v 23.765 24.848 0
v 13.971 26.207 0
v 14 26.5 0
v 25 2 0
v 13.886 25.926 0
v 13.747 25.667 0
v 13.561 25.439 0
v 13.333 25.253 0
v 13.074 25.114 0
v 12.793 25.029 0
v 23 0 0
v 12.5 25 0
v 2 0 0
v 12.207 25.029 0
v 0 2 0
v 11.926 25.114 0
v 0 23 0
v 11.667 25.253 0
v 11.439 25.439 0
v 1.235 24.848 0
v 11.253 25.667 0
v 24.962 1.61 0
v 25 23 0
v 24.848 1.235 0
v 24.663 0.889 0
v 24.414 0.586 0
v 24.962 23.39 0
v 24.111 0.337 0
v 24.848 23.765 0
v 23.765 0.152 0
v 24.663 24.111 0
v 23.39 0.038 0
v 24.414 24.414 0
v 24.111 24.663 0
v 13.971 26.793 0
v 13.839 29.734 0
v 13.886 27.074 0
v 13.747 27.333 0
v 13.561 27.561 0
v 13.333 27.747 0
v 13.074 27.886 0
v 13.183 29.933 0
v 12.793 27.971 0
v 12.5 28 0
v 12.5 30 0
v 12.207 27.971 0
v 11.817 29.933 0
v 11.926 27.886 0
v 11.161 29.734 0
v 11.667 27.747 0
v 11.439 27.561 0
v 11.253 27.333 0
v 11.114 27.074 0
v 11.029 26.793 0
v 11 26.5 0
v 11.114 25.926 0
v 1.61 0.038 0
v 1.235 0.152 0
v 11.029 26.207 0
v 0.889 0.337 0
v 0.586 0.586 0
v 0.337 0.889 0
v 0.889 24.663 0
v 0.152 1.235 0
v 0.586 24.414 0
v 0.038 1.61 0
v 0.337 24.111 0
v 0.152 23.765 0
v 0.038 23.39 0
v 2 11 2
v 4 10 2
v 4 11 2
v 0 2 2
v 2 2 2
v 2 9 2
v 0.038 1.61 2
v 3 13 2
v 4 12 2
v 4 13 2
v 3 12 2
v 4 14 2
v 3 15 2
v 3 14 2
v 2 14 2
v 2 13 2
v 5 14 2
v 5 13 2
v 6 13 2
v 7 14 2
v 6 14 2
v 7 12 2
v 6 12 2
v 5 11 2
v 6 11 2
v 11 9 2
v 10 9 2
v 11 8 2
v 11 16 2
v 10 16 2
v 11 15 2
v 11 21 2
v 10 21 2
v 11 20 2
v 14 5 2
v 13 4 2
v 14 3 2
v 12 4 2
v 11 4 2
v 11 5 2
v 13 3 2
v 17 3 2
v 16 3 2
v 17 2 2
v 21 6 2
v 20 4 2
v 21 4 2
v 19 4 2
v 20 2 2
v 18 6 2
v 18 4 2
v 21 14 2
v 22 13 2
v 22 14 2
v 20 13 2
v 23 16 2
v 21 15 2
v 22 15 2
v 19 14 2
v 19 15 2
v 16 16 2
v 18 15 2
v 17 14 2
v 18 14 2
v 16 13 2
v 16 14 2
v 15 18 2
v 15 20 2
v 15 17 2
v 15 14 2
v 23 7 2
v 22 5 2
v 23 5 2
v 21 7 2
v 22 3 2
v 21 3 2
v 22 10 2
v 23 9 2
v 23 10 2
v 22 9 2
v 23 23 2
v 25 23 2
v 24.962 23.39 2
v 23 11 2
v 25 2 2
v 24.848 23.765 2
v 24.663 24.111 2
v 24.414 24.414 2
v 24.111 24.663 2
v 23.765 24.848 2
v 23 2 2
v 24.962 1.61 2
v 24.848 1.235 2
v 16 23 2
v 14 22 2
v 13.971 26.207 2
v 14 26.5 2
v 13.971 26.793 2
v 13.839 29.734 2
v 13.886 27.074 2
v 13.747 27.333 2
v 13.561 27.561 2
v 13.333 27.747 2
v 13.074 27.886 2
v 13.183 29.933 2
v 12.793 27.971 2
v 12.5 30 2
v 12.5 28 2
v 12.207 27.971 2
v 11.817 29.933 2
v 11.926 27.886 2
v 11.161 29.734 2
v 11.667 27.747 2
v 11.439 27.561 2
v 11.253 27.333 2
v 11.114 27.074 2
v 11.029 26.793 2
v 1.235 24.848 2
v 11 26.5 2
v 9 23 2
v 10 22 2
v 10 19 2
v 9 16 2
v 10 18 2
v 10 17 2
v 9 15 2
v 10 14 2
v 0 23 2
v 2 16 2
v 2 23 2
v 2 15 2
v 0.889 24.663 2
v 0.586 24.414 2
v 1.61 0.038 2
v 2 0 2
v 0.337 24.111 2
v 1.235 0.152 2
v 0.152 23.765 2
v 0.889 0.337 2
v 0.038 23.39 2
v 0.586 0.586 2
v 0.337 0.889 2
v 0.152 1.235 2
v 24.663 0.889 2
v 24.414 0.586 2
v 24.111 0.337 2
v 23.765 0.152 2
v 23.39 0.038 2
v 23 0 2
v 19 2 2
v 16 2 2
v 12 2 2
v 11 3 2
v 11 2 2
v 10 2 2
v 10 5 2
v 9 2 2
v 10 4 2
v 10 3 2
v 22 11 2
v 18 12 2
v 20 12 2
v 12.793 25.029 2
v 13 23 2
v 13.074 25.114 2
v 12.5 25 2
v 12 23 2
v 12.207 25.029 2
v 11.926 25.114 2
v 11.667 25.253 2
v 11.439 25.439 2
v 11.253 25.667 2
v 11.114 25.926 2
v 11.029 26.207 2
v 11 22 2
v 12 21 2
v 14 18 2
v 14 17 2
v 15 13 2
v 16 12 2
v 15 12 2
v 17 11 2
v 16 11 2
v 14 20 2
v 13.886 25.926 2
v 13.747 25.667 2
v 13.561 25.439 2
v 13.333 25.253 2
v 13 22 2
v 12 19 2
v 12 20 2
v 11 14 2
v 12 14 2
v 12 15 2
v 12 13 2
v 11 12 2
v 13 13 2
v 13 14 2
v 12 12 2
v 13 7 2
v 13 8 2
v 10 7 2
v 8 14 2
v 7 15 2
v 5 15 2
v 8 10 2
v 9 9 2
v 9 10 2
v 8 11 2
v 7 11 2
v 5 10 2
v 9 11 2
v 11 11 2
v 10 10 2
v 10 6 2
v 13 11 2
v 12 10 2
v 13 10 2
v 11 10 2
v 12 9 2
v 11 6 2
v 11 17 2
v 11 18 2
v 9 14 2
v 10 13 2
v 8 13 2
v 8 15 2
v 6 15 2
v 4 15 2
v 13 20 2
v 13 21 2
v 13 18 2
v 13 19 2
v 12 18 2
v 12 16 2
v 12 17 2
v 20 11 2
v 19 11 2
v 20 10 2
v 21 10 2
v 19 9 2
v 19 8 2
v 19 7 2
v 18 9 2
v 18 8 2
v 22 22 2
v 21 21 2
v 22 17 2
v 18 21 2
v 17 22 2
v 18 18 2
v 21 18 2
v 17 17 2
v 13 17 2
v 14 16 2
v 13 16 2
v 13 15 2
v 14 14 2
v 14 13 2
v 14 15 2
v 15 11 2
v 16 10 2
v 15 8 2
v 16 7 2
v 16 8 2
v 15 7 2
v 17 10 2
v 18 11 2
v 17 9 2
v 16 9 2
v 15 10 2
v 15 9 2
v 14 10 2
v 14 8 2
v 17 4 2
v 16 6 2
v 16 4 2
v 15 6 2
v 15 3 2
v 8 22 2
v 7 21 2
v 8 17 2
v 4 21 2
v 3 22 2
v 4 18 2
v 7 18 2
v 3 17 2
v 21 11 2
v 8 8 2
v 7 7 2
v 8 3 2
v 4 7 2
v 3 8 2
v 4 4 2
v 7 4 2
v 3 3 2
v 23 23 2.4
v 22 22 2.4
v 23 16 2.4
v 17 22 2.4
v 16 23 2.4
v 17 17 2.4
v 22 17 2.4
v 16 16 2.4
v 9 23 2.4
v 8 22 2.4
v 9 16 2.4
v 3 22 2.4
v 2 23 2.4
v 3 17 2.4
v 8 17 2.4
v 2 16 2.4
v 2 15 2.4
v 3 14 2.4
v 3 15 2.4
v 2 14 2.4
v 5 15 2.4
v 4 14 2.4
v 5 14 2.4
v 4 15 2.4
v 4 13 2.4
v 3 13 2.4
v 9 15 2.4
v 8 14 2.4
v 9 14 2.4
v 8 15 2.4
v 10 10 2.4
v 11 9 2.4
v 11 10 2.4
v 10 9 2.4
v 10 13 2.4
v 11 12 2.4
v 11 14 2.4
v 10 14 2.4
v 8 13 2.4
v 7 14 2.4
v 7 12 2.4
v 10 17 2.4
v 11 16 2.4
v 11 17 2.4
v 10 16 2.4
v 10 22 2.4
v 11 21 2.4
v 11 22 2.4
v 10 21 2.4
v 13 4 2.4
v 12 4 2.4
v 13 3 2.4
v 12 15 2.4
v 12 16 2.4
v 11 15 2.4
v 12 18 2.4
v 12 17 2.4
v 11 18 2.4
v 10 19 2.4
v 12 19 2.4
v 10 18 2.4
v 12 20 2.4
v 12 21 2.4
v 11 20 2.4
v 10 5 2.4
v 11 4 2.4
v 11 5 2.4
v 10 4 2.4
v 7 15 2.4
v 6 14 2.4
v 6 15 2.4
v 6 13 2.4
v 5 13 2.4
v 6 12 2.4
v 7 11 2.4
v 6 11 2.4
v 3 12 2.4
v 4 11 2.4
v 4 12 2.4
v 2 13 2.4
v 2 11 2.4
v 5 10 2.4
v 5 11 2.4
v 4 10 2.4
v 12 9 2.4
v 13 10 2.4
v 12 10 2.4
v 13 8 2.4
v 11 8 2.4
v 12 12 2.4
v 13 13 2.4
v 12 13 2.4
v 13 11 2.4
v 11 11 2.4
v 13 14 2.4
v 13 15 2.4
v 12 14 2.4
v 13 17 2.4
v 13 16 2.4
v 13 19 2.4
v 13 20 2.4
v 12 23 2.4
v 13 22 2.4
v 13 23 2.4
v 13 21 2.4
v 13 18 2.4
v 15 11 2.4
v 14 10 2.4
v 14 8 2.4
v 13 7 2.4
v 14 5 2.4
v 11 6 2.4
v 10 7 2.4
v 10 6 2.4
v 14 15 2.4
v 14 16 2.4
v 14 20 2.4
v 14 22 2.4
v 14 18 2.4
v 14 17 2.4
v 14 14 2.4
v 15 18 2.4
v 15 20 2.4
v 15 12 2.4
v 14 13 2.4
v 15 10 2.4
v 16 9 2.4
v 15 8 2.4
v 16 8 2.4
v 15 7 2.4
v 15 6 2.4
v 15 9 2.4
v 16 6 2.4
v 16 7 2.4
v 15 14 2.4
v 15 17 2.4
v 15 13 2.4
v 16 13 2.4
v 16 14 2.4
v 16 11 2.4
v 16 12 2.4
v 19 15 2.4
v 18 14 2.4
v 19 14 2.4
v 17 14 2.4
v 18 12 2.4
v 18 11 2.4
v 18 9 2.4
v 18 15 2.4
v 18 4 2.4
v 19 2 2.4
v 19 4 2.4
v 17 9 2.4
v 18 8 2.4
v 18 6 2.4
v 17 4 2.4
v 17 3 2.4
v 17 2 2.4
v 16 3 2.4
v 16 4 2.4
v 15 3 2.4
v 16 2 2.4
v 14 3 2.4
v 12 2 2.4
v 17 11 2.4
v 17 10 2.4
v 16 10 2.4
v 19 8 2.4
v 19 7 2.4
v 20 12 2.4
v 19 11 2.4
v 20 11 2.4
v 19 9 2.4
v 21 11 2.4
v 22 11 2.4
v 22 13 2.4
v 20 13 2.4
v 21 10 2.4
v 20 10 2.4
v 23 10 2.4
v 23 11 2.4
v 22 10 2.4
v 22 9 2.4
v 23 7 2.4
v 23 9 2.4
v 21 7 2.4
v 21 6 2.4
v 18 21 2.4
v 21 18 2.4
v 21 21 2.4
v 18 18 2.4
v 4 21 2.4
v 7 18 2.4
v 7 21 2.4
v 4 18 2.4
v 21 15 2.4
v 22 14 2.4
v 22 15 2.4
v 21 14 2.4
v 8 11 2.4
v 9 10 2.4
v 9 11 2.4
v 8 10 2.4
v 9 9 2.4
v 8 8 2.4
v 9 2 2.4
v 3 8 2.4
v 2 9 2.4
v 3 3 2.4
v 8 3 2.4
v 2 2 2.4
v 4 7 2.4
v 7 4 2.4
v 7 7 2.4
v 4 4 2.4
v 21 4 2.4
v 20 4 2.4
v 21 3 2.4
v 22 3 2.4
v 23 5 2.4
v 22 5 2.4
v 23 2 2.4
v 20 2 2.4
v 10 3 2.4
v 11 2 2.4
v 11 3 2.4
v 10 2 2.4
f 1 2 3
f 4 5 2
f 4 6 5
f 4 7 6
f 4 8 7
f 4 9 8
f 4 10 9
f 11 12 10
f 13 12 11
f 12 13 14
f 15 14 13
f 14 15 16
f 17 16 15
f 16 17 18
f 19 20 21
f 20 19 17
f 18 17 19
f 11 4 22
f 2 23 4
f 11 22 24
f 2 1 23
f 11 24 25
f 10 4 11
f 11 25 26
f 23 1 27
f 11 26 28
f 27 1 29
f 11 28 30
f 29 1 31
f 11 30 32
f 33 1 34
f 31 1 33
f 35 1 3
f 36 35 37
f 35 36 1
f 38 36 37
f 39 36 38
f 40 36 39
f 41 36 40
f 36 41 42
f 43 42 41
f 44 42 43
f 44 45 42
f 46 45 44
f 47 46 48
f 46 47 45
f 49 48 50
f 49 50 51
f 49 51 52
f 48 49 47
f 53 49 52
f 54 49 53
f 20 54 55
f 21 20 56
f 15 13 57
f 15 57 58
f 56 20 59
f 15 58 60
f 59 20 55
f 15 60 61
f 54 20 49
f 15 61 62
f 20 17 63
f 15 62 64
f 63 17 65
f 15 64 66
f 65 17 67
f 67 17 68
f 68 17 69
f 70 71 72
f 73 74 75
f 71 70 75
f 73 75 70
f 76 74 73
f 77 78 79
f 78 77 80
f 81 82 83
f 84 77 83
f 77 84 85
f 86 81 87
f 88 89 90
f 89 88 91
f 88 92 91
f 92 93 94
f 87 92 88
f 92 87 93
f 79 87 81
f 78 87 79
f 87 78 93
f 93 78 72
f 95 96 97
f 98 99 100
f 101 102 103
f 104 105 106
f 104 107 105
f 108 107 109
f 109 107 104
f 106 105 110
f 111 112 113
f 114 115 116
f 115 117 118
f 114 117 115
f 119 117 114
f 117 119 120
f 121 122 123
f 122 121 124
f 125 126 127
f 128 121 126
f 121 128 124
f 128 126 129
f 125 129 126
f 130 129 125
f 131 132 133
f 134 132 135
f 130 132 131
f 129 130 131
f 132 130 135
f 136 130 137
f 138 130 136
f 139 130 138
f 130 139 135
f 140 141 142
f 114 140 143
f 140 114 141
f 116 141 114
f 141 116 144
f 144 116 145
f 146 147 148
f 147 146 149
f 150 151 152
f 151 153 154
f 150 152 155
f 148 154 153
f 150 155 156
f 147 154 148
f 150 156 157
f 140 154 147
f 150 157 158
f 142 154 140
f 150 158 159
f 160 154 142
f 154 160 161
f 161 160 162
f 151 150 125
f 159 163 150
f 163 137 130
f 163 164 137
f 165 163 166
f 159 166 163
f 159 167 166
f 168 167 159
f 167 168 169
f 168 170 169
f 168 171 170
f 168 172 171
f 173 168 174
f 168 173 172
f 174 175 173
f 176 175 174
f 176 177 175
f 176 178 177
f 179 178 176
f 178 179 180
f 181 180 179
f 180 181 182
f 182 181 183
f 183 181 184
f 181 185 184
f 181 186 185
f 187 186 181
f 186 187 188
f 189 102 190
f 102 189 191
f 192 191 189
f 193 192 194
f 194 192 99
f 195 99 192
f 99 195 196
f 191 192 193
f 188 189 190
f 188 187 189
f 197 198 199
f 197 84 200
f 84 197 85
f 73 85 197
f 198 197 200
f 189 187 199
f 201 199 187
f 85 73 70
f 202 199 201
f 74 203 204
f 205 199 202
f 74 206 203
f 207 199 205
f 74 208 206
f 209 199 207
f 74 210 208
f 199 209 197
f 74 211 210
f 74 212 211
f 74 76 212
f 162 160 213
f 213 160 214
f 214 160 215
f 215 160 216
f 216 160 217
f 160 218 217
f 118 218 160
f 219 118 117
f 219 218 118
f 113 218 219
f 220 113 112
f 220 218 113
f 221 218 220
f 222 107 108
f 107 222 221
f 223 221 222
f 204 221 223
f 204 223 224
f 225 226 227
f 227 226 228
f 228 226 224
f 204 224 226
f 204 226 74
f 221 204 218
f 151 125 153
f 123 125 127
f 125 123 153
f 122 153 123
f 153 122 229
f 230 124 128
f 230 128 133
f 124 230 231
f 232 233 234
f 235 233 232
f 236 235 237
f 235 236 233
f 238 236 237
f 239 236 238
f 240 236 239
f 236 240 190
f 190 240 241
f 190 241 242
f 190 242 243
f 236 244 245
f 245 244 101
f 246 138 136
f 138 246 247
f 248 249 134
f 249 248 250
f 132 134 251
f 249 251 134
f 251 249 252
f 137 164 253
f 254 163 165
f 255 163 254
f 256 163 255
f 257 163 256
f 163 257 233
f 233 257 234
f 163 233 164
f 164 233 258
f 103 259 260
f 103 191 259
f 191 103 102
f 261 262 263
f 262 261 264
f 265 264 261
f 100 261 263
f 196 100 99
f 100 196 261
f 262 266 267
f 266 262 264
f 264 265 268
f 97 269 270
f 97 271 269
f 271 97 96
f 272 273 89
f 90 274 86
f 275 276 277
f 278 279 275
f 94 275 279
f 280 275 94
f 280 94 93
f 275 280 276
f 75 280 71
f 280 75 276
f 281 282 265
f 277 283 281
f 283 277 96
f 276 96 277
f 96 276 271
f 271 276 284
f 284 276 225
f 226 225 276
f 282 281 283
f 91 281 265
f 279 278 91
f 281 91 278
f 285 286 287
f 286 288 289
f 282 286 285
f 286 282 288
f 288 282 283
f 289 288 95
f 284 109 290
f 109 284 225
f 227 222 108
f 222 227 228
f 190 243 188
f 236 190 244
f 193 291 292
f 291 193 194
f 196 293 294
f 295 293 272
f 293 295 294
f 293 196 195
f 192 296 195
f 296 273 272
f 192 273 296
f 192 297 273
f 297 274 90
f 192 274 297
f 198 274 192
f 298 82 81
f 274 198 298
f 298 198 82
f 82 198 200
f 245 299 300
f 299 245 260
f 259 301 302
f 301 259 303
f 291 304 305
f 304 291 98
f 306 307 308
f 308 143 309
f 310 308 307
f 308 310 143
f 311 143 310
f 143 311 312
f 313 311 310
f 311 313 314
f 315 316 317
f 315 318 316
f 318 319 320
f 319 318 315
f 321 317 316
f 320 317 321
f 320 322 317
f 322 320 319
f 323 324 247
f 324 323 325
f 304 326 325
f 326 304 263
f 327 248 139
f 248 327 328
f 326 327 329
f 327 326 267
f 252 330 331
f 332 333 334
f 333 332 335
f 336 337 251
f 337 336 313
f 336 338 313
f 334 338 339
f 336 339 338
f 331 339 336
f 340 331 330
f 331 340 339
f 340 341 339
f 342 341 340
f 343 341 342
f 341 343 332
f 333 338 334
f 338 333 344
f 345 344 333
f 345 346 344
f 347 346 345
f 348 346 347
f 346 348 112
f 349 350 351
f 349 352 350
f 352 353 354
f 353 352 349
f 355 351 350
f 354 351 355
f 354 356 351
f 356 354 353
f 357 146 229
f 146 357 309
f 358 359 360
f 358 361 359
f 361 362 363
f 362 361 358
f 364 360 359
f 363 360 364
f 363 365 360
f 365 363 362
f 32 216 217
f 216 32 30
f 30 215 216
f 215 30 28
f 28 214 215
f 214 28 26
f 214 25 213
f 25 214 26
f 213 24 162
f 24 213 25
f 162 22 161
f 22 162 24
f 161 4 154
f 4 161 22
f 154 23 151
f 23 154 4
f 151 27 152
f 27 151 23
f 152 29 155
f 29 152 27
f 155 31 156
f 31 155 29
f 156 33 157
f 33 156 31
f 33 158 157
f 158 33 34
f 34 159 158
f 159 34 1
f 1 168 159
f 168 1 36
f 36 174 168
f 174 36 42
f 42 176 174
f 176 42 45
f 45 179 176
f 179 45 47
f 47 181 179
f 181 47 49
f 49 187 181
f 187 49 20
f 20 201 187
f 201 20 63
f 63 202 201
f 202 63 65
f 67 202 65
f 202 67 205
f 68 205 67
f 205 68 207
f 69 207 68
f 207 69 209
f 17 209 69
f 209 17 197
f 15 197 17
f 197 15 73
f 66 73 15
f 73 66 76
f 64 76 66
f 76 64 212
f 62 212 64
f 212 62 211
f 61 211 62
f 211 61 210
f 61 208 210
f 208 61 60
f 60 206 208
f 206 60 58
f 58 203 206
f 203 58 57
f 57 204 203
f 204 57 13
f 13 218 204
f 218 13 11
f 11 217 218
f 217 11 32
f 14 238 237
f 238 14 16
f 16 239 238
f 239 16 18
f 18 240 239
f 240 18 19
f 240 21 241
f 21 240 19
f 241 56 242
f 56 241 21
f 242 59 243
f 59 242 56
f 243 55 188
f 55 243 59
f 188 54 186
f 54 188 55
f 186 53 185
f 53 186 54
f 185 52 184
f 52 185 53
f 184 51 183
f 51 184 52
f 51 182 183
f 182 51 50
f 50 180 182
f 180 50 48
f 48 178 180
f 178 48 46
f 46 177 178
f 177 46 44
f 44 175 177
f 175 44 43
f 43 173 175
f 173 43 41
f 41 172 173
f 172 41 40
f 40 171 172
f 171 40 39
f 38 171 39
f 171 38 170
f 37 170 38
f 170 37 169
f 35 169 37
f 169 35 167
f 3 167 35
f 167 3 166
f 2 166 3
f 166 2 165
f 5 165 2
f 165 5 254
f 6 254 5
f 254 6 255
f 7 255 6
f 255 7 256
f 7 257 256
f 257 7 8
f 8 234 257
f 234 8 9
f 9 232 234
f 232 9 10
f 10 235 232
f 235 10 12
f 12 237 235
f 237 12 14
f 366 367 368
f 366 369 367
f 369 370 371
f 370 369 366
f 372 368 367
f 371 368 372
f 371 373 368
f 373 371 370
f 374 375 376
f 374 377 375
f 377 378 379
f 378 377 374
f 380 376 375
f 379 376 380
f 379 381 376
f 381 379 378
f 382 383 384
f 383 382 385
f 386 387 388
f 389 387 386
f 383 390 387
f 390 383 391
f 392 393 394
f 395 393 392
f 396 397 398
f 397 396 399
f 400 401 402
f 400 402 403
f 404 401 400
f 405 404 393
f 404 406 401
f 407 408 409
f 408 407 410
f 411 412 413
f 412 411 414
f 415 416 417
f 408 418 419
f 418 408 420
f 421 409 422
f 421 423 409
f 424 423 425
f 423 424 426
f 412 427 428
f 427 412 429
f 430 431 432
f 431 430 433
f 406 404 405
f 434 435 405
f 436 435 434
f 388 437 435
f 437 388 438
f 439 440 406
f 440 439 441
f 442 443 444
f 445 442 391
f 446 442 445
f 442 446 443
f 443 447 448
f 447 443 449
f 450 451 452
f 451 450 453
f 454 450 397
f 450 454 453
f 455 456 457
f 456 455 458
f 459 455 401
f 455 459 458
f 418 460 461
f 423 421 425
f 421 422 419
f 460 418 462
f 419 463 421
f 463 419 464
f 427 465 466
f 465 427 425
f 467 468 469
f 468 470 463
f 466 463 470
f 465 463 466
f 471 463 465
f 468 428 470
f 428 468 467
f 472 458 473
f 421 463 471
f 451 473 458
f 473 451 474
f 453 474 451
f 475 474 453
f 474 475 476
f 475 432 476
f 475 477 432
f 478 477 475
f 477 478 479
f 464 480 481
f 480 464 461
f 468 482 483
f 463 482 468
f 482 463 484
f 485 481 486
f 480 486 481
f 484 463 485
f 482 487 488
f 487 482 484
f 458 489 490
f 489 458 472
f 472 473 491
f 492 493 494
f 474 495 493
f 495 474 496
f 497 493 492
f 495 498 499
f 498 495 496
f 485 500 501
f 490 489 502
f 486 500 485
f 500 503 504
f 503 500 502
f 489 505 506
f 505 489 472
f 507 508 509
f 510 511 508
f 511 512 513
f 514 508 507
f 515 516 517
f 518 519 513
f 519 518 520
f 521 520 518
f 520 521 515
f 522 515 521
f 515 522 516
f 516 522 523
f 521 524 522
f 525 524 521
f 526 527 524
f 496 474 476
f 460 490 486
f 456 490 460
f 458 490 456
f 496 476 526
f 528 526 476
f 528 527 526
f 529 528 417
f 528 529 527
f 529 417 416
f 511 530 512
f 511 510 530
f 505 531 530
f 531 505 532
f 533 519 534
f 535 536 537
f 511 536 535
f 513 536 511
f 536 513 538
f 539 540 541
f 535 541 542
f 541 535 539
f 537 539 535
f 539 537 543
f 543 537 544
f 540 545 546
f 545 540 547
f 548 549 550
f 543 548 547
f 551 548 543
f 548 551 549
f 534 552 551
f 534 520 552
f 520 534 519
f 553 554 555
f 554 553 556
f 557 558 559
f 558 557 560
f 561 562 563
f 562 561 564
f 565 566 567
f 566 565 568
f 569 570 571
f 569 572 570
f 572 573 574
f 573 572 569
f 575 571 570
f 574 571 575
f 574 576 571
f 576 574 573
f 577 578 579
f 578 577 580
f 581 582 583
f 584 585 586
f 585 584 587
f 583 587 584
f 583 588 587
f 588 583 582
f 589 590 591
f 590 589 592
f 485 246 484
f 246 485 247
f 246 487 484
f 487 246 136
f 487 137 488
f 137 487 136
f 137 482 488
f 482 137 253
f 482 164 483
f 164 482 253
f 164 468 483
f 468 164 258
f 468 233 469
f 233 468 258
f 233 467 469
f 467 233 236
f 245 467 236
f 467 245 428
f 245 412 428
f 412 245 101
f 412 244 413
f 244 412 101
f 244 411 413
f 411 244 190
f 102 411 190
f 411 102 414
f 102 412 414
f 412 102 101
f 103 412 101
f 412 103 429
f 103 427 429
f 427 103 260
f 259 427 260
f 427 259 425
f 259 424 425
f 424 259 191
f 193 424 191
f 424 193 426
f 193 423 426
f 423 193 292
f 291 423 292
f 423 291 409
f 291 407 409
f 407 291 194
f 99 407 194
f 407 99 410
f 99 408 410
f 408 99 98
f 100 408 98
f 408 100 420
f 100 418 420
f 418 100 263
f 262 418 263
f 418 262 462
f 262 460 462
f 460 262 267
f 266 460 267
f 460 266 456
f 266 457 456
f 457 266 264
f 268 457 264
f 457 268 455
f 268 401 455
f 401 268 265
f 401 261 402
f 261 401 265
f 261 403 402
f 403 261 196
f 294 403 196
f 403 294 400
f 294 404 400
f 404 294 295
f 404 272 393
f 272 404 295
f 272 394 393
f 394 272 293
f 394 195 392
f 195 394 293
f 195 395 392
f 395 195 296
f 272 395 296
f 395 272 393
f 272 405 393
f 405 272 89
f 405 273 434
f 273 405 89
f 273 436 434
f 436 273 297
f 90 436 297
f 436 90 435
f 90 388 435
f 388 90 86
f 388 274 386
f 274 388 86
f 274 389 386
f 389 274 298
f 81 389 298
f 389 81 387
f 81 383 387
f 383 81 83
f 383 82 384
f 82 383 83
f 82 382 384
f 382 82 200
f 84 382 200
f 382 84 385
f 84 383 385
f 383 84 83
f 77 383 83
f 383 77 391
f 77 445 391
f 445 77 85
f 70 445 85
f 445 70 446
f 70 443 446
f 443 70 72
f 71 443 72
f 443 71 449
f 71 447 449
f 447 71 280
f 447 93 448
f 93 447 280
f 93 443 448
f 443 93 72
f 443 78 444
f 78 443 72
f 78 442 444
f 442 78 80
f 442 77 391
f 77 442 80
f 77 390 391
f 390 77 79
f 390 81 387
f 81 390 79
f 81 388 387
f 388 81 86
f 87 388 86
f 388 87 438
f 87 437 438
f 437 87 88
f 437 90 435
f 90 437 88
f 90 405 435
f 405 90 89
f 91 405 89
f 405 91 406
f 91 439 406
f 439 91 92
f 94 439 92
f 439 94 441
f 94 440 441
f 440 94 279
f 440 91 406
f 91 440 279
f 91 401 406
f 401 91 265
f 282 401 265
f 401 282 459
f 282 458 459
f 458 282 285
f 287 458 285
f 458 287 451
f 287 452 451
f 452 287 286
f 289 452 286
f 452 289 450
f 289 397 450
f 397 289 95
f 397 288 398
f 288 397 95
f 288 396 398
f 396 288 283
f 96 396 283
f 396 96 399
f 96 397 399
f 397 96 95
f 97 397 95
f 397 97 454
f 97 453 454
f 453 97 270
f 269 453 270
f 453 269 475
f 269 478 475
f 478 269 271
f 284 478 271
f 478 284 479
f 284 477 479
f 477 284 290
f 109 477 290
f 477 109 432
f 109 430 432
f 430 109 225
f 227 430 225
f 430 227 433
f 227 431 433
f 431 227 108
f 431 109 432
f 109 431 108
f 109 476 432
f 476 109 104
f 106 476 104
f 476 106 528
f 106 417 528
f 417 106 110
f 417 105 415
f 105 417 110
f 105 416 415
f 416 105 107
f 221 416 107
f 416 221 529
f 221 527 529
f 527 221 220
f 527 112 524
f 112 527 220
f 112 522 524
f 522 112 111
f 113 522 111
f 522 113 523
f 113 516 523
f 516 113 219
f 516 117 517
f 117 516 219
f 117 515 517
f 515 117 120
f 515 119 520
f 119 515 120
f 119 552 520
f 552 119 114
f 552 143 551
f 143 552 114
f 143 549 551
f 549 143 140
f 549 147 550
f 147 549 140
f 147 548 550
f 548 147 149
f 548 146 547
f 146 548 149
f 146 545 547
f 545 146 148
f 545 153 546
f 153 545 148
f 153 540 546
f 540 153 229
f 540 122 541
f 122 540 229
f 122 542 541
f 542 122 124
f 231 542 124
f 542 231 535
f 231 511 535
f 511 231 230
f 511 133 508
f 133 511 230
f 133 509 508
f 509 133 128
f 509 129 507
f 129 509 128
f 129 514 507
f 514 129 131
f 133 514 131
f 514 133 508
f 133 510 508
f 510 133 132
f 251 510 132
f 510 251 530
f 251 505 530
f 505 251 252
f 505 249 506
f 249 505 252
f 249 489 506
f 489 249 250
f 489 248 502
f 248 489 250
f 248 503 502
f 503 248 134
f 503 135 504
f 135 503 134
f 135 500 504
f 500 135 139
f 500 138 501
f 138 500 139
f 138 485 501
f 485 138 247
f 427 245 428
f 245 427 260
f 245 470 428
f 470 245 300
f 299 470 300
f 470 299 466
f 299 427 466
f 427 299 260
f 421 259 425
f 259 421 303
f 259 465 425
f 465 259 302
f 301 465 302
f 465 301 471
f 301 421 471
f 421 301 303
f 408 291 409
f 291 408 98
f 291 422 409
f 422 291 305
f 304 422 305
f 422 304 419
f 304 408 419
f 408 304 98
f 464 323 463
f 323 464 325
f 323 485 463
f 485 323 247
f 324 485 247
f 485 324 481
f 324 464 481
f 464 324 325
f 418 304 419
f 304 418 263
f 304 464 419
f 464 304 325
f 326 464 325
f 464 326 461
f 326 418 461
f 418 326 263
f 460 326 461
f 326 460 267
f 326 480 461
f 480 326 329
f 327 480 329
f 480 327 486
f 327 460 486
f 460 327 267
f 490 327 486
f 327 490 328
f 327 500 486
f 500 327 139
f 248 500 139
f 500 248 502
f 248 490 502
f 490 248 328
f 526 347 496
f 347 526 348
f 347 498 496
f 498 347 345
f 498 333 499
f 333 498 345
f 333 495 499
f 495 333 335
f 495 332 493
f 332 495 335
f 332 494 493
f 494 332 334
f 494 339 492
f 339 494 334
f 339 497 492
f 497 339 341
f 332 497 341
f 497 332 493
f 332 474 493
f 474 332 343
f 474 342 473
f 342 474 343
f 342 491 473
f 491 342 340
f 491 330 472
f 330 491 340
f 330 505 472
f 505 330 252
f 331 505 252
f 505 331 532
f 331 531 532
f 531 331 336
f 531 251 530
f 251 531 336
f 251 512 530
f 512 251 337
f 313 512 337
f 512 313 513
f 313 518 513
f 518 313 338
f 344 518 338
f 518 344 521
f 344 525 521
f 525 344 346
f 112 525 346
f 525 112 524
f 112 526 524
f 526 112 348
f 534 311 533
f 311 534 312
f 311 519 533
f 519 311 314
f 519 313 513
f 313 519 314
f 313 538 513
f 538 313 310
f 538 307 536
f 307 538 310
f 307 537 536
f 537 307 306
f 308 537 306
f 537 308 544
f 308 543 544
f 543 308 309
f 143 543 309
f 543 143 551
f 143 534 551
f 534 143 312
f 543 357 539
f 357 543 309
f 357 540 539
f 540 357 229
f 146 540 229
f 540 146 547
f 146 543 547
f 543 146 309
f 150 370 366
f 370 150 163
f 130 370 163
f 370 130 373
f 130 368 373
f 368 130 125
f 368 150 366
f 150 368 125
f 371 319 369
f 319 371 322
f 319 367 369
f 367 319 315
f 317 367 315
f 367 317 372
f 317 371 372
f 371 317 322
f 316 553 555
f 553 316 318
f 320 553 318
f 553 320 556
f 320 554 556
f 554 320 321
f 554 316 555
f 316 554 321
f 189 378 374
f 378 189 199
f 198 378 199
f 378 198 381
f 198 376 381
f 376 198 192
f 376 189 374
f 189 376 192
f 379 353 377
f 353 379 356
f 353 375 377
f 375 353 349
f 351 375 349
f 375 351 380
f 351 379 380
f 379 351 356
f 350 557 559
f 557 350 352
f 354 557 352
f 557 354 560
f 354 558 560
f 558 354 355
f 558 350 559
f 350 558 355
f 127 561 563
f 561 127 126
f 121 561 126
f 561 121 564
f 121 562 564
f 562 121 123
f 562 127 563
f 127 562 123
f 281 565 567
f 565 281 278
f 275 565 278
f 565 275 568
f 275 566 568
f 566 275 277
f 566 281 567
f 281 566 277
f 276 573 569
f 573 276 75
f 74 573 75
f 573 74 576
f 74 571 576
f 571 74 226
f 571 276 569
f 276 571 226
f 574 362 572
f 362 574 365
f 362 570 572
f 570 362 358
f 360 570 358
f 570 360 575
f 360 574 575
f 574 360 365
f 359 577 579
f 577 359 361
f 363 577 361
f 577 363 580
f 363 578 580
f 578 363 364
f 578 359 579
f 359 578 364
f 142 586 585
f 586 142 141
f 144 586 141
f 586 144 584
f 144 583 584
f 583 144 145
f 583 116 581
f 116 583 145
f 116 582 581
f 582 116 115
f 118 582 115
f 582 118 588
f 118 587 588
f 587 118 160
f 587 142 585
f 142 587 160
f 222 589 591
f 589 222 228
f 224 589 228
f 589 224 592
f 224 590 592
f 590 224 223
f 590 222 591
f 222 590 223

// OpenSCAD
// This demo shows how to use the QR code generator to generate a tag (ie. for a dog collar)
// with size derived from the amount of data to encode.

include <qr.scad>;

/* [Print options] */
// The minimum printable module ("pixel") size, based on the printer's resolution
module_size = 1;

/* [Tag options] */
// The data to encode
data = "Hello, world!";
// Error correction level (L, M, Q, H)
error_correction = "M"; // [L, M, Q, H]
// Thickness of the tag base
base_thickness = 2;
// Thickness of the embossed code
code_thickness = .4;
// Space between the QR code and the tag's edge
padding = 2;
// Diameter of the hole for the tag's ring; set to 0 to disable
hole_diameter = 3;
// Tag corner radius
corner_radius = 2;

/* [Hidden] */
$fn = 32;
modules = qr_size(message = data);
size = modules * module_size + padding * 2;

// Create the baseplate
color("#ccc") linear_extrude(height = base_thickness) difference() {
    // Outer shape
    hull() {
        translate([corner_radius, corner_radius]) circle(r = corner_radius);
        translate([size - corner_radius, corner_radius]) circle(r = corner_radius);
        translate([corner_radius, size - corner_radius]) circle(r = corner_radius);
        translate([size - corner_radius, size - corner_radius]) circle(r = corner_radius);
        if(hole_diameter > 0) translate([size / 2, size + hole_diameter / 2]) circle(d = hole_diameter + 2 * padding);
    }
    if(hole_diameter > 0) translate([size / 2, size + hole_diameter / 2]) circle(d = hole_diameter);
}

// Create the QR code
color("#333")
translate([padding, padding, base_thickness]) qr(message = data, error_correction = error_correction, width = module_size * modules, height = module_size * modules, thickness = code_thickness);
